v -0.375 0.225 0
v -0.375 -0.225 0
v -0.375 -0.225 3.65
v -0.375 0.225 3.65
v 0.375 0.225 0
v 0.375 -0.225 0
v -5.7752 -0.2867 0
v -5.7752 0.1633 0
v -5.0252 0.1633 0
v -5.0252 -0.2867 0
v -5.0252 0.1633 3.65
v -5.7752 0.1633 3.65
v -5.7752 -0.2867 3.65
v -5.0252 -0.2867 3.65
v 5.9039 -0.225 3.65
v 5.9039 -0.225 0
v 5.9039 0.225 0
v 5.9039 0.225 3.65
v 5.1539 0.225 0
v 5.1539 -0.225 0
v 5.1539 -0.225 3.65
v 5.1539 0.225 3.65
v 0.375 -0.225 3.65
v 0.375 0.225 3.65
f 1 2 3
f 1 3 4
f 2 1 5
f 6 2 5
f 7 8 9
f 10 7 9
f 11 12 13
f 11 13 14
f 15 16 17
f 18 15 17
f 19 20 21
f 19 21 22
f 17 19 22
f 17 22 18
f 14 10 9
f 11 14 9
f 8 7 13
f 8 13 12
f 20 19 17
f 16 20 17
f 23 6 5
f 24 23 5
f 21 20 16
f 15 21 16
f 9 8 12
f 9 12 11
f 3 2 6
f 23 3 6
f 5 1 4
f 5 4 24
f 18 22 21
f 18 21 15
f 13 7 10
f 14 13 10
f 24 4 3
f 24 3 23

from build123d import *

# Parameters (mm, degrees)
CROQUIS1_W                = 0.75
CROQUIS1_H                = 0.45
SALIENTE_EXTRUIR1_DEPTH   = 3.65
SALIENTE_EXTRUIR1_2_DEPTH = 3.65
SALIENTE_EXTRUIR1_3_DEPTH = 3.65


with BuildPart() as part:
    # Croquis1 → Saliente-Extruir1 (new body)
    with BuildSketch(Plane.XY):
        with Locations((-5.400229137, -0.061703165)):
            Rectangle(CROQUIS1_W, CROQUIS1_H)
    extrude(amount=SALIENTE_EXTRUIR1_DEPTH)


with BuildPart() as body_2:
    # Croquis1 → Saliente-Extruir1 2 (new body)
    with BuildSketch(Plane.XY):
        Rectangle(CROQUIS1_W, CROQUIS1_H)
    extrude(amount=SALIENTE_EXTRUIR1_2_DEPTH)


with BuildPart() as body_3:
    # Croquis1 → Saliente-Extruir1 3 (new body)
    with BuildSketch(Plane.XY):
        with Locations((5.528878755, 0)):
            Rectangle(CROQUIS1_W, CROQUIS1_H)
    extrude(amount=SALIENTE_EXTRUIR1_3_DEPTH)


solid = Compound([part.part, body_2.part, body_3.part])
